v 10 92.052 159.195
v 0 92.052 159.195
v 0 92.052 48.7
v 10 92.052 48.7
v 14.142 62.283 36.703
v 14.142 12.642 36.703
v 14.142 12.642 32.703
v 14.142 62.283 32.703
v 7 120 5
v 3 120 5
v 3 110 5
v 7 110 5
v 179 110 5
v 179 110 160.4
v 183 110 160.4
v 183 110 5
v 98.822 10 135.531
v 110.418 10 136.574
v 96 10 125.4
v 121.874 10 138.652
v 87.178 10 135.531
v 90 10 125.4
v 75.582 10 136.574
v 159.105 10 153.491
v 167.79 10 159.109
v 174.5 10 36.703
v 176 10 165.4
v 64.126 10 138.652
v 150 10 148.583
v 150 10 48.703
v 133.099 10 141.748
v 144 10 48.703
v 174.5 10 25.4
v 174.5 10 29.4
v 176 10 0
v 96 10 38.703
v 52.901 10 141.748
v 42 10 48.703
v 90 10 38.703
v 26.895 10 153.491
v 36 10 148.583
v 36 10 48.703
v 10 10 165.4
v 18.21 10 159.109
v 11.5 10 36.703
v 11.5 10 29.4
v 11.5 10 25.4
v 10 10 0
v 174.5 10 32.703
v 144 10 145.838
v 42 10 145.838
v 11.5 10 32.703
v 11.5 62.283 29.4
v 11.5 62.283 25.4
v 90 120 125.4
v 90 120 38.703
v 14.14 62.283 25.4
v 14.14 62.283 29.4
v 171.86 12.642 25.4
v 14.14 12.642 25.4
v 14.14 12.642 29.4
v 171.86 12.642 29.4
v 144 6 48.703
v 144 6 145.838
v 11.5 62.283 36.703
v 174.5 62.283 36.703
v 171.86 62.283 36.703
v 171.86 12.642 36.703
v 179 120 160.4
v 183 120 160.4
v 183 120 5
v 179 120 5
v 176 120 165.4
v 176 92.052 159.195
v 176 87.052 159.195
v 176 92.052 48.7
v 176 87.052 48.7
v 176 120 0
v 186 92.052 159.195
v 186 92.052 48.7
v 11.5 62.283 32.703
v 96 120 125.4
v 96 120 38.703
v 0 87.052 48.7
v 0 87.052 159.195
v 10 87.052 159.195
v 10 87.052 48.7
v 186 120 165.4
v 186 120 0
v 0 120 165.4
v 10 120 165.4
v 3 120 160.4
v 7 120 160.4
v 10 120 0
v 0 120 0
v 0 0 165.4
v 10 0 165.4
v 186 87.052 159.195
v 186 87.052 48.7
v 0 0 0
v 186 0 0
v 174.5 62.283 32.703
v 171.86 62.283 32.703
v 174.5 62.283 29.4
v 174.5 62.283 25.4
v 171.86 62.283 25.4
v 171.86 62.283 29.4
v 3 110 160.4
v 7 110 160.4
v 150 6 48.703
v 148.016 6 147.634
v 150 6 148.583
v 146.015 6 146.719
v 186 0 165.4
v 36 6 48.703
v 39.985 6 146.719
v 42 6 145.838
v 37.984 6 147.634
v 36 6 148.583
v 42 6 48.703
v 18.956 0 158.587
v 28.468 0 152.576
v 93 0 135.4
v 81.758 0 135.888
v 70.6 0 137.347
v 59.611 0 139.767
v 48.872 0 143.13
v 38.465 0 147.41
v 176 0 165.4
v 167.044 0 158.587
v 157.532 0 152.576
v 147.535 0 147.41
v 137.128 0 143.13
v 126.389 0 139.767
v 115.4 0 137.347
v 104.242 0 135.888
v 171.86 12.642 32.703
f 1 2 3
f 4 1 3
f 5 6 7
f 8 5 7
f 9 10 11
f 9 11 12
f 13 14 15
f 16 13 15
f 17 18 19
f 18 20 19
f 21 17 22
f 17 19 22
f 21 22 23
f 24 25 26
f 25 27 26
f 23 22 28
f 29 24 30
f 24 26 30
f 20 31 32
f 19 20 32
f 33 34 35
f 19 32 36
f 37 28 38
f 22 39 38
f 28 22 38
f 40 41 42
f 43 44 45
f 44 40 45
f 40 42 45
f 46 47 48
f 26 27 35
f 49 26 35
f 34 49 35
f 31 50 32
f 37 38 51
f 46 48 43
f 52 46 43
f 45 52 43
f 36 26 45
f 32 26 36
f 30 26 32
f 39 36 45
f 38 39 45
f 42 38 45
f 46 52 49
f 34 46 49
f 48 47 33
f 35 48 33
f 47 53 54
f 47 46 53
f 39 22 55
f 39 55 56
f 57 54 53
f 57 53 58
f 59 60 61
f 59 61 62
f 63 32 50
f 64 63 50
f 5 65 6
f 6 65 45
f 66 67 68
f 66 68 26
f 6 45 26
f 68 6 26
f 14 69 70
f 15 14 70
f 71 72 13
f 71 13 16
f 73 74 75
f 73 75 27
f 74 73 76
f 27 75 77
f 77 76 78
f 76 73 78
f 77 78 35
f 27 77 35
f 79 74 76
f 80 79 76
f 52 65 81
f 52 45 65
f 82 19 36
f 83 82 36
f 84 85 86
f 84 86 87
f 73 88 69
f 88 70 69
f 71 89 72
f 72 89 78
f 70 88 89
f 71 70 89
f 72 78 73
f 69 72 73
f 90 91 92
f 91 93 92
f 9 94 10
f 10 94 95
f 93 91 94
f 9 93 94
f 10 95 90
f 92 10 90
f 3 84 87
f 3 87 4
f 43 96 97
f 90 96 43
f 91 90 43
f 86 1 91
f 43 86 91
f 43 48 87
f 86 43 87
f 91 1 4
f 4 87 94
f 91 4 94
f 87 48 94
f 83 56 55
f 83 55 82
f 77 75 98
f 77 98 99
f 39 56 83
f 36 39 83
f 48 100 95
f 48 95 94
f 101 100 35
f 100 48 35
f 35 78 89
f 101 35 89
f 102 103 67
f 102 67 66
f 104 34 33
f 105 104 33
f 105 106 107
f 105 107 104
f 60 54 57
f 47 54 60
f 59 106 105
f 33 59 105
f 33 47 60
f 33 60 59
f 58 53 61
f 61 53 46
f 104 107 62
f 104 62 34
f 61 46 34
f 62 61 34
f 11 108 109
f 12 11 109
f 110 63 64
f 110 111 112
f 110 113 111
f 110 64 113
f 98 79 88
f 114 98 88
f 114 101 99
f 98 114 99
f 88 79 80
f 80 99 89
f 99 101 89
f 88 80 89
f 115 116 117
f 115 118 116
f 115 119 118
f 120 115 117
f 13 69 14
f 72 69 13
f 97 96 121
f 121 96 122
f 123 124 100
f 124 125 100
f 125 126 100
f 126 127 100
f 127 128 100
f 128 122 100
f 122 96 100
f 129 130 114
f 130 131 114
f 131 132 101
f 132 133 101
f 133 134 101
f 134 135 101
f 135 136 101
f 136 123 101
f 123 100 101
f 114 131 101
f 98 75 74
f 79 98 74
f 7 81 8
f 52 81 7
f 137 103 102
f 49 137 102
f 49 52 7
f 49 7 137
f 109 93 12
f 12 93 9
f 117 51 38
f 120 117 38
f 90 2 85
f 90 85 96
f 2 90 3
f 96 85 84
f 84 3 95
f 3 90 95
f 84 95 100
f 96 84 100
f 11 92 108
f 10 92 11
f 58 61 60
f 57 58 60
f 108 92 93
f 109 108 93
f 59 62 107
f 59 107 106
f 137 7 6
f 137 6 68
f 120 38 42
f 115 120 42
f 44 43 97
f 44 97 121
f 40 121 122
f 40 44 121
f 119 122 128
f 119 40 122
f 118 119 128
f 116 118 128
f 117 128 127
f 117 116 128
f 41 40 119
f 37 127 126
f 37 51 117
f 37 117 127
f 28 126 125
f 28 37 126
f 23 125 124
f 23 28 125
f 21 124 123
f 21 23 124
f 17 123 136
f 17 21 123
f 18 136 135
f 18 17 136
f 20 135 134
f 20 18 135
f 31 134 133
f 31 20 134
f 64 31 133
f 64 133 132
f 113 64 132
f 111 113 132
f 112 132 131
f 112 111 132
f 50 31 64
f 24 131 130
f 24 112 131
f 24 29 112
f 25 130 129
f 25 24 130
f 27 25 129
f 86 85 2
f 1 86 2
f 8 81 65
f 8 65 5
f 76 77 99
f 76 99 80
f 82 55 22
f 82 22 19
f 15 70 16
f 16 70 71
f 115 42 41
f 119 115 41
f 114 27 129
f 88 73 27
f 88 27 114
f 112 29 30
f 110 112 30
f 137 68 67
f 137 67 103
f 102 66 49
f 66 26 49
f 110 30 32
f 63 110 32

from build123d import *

# Parameters (mm, degrees)
EXTRUDE_THIN2_DEPTH     = 165.4
SKETCH11_W              = 163
SKETCH11_H              = 4
BOSS_EXTRUDE3_DEPTH     = 2.6416
CUT_EXTRUDE6_DEPTH      = 270.69086006
CUT_EXTRUDE6_DEPTH_BACK = 270.69086006
SKETCH13_W              = 110.495011338
SKETCH13_H              = 5
CUT_EXTRUDE7_DEPTH      = 273.127102656
SKETCH19_W              = 4
SKETCH19_H              = 155.4
CUT_EXTRUDE9_DEPTH      = 10
SKETCH20_W              = 4
SKETCH20_H              = 155.4
CUT_EXTRUDE10_DEPTH     = 10
SKETCH21_W              = 6
SKETCH21_H              = 86.697
BOSS_EXTRUDE4_DEPTH     = 110
CUT_EXTRUDE11_DEPTH     = 4
SKETCH23_W              = 163
SKETCH23_H              = 4
BOSS_EXTRUDE5_DEPTH     = 2.6416
SKETCH24_W              = 2.6416
SKETCH24_H              = 4
BOSS_EXTRUDE6_DEPTH     = 49.6416
SKETCH25_W              = 2.64
SKETCH25_H              = 4
BOSS_EXTRUDE7_DEPTH     = 49.6416
SKETCH26_W              = 2.64
SKETCH26_H              = 4
BOSS_EXTRUDE8_DEPTH     = 49.6416


with BuildPart() as part:
    # Sketch2 → Extrude-Thin2 (new body)
    with BuildSketch(Plane.XY):
        Polygon((0, 120), (0, 0), (186, 0), (186, 120), (176, 120), (176, 10), (10, 10), (10, 120), align=None)
    extrude(amount=EXTRUDE_THIN2_DEPTH)

    # Sketch11 → Boss-Extrude3 (add)
    with BuildSketch(Plane(origin=(0, 10, 0), x_dir=(1, 0, 0), z_dir=(0, 1, 0))):
        with Locations((93, -34.703)):
            Rectangle(SKETCH11_W, SKETCH11_H)
    extrude(amount=BOSS_EXTRUDE3_DEPTH)

    # Sketch13 → Cut-Extrude6 (cut, two sides: drawn at the far end of the back side and taken through both)
    with BuildSketch(Plane(origin=(10, 0, 0), x_dir=(0, 0, -1), z_dir=(1, 0, 0)).offset(-CUT_EXTRUDE6_DEPTH_BACK)):
        with Locations((-103.947505669, 89.551599899)):
            Rectangle(SKETCH13_W, SKETCH13_H)
    extrude(amount=CUT_EXTRUDE6_DEPTH + CUT_EXTRUDE6_DEPTH_BACK, mode=Mode.SUBTRACT)

    # Sketch14 → Cut-Extrude7 (cut, through all)
    with BuildSketch(Plane(origin=(0, 10, 0), x_dir=(1, 0, 0), z_dir=(0, 1, 0))):
        with BuildLine():
            Line((176, -165.4), (10, -165.4))
            ThreePointArc((10, -165.4), (93, -135.4), (176, -165.4))
        make_face()
    extrude(amount=-CUT_EXTRUDE7_DEPTH, mode=Mode.SUBTRACT)

    # Sketch19 → Cut-Extrude9 (cut)
    with BuildSketch(Plane(origin=(0, 120, 0), x_dir=(1, 0, 0), z_dir=(0, 1, 0))):
        with Locations((5, -82.7)):
            Rectangle(SKETCH19_W, SKETCH19_H)
    extrude(amount=-CUT_EXTRUDE9_DEPTH, mode=Mode.SUBTRACT)

    # Sketch20 → Cut-Extrude10 (cut)
    with BuildSketch(Plane(origin=(0, 120, 0), x_dir=(1, 0, 0), z_dir=(0, 1, 0))):
        with Locations((181, -82.7)):
            Rectangle(SKETCH20_W, SKETCH20_H)
    extrude(amount=-CUT_EXTRUDE10_DEPTH, mode=Mode.SUBTRACT)

    # Sketch21 → Boss-Extrude4 (add, through all)
    with BuildSketch(Plane(origin=(0, 10, 0), x_dir=(1, 0, 0), z_dir=(0, 1, 0))):
        with Locations((93, -82.0515)):
            Rectangle(SKETCH21_W, SKETCH21_H)
    extrude(amount=BOSS_EXTRUDE4_DEPTH)

    # Sketch22 → Cut-Extrude11 (cut)
    with BuildSketch(Plane(origin=(0, 10, 0), x_dir=(1, 0, 0), z_dir=(0, 1, 0))):
        Polygon((36, -48.703), (36, -148.583194008), (42, -145.837577441), (42, -48.703), align=None)
        Polygon((144, -145.837577441), (150, -148.583194008), (150, -48.703), (144, -48.703), align=None)
    extrude(amount=-CUT_EXTRUDE11_DEPTH, mode=Mode.SUBTRACT)

    # Sketch23 → Boss-Extrude5 (add)
    with BuildSketch(Plane(origin=(0, 10, 0), x_dir=(1, 0, 0), z_dir=(0, 1, 0))):
        with Locations((93, -27.4)):
            Rectangle(SKETCH23_W, SKETCH23_H)
    extrude(amount=BOSS_EXTRUDE5_DEPTH)

    # Sketch24 → Boss-Extrude6 (add)
    with BuildSketch(Plane(origin=(0, 12.6416, 0), x_dir=(1, 0, 0), z_dir=(0, 1, 0))):
        with Locations((12.8208, -34.703)):
            Rectangle(SKETCH24_W, SKETCH24_H)
    extrude(amount=BOSS_EXTRUDE6_DEPTH)

    # Sketch25 → Boss-Extrude7 (add)
    with BuildSketch(Plane(origin=(0, 12.6416, 0), x_dir=(1, 0, 0), z_dir=(0, 1, 0))):
        with Locations((12.82, -27.4)):
            Rectangle(SKETCH25_W, SKETCH25_H)
    extrude(amount=BOSS_EXTRUDE7_DEPTH)

    # Sketch26 → Boss-Extrude8 (add)
    with BuildSketch(Plane(origin=(0, 12.6416, 0), x_dir=(1, 0, 0), z_dir=(0, 1, 0))):
        with Locations((173.18, -34.703)):
            Rectangle(SKETCH26_W, SKETCH26_H)
        with Locations((173.18, -27.4)):
            Rectangle(SKETCH26_W, SKETCH26_H)
    extrude(amount=BOSS_EXTRUDE8_DEPTH)


solid = part.part
